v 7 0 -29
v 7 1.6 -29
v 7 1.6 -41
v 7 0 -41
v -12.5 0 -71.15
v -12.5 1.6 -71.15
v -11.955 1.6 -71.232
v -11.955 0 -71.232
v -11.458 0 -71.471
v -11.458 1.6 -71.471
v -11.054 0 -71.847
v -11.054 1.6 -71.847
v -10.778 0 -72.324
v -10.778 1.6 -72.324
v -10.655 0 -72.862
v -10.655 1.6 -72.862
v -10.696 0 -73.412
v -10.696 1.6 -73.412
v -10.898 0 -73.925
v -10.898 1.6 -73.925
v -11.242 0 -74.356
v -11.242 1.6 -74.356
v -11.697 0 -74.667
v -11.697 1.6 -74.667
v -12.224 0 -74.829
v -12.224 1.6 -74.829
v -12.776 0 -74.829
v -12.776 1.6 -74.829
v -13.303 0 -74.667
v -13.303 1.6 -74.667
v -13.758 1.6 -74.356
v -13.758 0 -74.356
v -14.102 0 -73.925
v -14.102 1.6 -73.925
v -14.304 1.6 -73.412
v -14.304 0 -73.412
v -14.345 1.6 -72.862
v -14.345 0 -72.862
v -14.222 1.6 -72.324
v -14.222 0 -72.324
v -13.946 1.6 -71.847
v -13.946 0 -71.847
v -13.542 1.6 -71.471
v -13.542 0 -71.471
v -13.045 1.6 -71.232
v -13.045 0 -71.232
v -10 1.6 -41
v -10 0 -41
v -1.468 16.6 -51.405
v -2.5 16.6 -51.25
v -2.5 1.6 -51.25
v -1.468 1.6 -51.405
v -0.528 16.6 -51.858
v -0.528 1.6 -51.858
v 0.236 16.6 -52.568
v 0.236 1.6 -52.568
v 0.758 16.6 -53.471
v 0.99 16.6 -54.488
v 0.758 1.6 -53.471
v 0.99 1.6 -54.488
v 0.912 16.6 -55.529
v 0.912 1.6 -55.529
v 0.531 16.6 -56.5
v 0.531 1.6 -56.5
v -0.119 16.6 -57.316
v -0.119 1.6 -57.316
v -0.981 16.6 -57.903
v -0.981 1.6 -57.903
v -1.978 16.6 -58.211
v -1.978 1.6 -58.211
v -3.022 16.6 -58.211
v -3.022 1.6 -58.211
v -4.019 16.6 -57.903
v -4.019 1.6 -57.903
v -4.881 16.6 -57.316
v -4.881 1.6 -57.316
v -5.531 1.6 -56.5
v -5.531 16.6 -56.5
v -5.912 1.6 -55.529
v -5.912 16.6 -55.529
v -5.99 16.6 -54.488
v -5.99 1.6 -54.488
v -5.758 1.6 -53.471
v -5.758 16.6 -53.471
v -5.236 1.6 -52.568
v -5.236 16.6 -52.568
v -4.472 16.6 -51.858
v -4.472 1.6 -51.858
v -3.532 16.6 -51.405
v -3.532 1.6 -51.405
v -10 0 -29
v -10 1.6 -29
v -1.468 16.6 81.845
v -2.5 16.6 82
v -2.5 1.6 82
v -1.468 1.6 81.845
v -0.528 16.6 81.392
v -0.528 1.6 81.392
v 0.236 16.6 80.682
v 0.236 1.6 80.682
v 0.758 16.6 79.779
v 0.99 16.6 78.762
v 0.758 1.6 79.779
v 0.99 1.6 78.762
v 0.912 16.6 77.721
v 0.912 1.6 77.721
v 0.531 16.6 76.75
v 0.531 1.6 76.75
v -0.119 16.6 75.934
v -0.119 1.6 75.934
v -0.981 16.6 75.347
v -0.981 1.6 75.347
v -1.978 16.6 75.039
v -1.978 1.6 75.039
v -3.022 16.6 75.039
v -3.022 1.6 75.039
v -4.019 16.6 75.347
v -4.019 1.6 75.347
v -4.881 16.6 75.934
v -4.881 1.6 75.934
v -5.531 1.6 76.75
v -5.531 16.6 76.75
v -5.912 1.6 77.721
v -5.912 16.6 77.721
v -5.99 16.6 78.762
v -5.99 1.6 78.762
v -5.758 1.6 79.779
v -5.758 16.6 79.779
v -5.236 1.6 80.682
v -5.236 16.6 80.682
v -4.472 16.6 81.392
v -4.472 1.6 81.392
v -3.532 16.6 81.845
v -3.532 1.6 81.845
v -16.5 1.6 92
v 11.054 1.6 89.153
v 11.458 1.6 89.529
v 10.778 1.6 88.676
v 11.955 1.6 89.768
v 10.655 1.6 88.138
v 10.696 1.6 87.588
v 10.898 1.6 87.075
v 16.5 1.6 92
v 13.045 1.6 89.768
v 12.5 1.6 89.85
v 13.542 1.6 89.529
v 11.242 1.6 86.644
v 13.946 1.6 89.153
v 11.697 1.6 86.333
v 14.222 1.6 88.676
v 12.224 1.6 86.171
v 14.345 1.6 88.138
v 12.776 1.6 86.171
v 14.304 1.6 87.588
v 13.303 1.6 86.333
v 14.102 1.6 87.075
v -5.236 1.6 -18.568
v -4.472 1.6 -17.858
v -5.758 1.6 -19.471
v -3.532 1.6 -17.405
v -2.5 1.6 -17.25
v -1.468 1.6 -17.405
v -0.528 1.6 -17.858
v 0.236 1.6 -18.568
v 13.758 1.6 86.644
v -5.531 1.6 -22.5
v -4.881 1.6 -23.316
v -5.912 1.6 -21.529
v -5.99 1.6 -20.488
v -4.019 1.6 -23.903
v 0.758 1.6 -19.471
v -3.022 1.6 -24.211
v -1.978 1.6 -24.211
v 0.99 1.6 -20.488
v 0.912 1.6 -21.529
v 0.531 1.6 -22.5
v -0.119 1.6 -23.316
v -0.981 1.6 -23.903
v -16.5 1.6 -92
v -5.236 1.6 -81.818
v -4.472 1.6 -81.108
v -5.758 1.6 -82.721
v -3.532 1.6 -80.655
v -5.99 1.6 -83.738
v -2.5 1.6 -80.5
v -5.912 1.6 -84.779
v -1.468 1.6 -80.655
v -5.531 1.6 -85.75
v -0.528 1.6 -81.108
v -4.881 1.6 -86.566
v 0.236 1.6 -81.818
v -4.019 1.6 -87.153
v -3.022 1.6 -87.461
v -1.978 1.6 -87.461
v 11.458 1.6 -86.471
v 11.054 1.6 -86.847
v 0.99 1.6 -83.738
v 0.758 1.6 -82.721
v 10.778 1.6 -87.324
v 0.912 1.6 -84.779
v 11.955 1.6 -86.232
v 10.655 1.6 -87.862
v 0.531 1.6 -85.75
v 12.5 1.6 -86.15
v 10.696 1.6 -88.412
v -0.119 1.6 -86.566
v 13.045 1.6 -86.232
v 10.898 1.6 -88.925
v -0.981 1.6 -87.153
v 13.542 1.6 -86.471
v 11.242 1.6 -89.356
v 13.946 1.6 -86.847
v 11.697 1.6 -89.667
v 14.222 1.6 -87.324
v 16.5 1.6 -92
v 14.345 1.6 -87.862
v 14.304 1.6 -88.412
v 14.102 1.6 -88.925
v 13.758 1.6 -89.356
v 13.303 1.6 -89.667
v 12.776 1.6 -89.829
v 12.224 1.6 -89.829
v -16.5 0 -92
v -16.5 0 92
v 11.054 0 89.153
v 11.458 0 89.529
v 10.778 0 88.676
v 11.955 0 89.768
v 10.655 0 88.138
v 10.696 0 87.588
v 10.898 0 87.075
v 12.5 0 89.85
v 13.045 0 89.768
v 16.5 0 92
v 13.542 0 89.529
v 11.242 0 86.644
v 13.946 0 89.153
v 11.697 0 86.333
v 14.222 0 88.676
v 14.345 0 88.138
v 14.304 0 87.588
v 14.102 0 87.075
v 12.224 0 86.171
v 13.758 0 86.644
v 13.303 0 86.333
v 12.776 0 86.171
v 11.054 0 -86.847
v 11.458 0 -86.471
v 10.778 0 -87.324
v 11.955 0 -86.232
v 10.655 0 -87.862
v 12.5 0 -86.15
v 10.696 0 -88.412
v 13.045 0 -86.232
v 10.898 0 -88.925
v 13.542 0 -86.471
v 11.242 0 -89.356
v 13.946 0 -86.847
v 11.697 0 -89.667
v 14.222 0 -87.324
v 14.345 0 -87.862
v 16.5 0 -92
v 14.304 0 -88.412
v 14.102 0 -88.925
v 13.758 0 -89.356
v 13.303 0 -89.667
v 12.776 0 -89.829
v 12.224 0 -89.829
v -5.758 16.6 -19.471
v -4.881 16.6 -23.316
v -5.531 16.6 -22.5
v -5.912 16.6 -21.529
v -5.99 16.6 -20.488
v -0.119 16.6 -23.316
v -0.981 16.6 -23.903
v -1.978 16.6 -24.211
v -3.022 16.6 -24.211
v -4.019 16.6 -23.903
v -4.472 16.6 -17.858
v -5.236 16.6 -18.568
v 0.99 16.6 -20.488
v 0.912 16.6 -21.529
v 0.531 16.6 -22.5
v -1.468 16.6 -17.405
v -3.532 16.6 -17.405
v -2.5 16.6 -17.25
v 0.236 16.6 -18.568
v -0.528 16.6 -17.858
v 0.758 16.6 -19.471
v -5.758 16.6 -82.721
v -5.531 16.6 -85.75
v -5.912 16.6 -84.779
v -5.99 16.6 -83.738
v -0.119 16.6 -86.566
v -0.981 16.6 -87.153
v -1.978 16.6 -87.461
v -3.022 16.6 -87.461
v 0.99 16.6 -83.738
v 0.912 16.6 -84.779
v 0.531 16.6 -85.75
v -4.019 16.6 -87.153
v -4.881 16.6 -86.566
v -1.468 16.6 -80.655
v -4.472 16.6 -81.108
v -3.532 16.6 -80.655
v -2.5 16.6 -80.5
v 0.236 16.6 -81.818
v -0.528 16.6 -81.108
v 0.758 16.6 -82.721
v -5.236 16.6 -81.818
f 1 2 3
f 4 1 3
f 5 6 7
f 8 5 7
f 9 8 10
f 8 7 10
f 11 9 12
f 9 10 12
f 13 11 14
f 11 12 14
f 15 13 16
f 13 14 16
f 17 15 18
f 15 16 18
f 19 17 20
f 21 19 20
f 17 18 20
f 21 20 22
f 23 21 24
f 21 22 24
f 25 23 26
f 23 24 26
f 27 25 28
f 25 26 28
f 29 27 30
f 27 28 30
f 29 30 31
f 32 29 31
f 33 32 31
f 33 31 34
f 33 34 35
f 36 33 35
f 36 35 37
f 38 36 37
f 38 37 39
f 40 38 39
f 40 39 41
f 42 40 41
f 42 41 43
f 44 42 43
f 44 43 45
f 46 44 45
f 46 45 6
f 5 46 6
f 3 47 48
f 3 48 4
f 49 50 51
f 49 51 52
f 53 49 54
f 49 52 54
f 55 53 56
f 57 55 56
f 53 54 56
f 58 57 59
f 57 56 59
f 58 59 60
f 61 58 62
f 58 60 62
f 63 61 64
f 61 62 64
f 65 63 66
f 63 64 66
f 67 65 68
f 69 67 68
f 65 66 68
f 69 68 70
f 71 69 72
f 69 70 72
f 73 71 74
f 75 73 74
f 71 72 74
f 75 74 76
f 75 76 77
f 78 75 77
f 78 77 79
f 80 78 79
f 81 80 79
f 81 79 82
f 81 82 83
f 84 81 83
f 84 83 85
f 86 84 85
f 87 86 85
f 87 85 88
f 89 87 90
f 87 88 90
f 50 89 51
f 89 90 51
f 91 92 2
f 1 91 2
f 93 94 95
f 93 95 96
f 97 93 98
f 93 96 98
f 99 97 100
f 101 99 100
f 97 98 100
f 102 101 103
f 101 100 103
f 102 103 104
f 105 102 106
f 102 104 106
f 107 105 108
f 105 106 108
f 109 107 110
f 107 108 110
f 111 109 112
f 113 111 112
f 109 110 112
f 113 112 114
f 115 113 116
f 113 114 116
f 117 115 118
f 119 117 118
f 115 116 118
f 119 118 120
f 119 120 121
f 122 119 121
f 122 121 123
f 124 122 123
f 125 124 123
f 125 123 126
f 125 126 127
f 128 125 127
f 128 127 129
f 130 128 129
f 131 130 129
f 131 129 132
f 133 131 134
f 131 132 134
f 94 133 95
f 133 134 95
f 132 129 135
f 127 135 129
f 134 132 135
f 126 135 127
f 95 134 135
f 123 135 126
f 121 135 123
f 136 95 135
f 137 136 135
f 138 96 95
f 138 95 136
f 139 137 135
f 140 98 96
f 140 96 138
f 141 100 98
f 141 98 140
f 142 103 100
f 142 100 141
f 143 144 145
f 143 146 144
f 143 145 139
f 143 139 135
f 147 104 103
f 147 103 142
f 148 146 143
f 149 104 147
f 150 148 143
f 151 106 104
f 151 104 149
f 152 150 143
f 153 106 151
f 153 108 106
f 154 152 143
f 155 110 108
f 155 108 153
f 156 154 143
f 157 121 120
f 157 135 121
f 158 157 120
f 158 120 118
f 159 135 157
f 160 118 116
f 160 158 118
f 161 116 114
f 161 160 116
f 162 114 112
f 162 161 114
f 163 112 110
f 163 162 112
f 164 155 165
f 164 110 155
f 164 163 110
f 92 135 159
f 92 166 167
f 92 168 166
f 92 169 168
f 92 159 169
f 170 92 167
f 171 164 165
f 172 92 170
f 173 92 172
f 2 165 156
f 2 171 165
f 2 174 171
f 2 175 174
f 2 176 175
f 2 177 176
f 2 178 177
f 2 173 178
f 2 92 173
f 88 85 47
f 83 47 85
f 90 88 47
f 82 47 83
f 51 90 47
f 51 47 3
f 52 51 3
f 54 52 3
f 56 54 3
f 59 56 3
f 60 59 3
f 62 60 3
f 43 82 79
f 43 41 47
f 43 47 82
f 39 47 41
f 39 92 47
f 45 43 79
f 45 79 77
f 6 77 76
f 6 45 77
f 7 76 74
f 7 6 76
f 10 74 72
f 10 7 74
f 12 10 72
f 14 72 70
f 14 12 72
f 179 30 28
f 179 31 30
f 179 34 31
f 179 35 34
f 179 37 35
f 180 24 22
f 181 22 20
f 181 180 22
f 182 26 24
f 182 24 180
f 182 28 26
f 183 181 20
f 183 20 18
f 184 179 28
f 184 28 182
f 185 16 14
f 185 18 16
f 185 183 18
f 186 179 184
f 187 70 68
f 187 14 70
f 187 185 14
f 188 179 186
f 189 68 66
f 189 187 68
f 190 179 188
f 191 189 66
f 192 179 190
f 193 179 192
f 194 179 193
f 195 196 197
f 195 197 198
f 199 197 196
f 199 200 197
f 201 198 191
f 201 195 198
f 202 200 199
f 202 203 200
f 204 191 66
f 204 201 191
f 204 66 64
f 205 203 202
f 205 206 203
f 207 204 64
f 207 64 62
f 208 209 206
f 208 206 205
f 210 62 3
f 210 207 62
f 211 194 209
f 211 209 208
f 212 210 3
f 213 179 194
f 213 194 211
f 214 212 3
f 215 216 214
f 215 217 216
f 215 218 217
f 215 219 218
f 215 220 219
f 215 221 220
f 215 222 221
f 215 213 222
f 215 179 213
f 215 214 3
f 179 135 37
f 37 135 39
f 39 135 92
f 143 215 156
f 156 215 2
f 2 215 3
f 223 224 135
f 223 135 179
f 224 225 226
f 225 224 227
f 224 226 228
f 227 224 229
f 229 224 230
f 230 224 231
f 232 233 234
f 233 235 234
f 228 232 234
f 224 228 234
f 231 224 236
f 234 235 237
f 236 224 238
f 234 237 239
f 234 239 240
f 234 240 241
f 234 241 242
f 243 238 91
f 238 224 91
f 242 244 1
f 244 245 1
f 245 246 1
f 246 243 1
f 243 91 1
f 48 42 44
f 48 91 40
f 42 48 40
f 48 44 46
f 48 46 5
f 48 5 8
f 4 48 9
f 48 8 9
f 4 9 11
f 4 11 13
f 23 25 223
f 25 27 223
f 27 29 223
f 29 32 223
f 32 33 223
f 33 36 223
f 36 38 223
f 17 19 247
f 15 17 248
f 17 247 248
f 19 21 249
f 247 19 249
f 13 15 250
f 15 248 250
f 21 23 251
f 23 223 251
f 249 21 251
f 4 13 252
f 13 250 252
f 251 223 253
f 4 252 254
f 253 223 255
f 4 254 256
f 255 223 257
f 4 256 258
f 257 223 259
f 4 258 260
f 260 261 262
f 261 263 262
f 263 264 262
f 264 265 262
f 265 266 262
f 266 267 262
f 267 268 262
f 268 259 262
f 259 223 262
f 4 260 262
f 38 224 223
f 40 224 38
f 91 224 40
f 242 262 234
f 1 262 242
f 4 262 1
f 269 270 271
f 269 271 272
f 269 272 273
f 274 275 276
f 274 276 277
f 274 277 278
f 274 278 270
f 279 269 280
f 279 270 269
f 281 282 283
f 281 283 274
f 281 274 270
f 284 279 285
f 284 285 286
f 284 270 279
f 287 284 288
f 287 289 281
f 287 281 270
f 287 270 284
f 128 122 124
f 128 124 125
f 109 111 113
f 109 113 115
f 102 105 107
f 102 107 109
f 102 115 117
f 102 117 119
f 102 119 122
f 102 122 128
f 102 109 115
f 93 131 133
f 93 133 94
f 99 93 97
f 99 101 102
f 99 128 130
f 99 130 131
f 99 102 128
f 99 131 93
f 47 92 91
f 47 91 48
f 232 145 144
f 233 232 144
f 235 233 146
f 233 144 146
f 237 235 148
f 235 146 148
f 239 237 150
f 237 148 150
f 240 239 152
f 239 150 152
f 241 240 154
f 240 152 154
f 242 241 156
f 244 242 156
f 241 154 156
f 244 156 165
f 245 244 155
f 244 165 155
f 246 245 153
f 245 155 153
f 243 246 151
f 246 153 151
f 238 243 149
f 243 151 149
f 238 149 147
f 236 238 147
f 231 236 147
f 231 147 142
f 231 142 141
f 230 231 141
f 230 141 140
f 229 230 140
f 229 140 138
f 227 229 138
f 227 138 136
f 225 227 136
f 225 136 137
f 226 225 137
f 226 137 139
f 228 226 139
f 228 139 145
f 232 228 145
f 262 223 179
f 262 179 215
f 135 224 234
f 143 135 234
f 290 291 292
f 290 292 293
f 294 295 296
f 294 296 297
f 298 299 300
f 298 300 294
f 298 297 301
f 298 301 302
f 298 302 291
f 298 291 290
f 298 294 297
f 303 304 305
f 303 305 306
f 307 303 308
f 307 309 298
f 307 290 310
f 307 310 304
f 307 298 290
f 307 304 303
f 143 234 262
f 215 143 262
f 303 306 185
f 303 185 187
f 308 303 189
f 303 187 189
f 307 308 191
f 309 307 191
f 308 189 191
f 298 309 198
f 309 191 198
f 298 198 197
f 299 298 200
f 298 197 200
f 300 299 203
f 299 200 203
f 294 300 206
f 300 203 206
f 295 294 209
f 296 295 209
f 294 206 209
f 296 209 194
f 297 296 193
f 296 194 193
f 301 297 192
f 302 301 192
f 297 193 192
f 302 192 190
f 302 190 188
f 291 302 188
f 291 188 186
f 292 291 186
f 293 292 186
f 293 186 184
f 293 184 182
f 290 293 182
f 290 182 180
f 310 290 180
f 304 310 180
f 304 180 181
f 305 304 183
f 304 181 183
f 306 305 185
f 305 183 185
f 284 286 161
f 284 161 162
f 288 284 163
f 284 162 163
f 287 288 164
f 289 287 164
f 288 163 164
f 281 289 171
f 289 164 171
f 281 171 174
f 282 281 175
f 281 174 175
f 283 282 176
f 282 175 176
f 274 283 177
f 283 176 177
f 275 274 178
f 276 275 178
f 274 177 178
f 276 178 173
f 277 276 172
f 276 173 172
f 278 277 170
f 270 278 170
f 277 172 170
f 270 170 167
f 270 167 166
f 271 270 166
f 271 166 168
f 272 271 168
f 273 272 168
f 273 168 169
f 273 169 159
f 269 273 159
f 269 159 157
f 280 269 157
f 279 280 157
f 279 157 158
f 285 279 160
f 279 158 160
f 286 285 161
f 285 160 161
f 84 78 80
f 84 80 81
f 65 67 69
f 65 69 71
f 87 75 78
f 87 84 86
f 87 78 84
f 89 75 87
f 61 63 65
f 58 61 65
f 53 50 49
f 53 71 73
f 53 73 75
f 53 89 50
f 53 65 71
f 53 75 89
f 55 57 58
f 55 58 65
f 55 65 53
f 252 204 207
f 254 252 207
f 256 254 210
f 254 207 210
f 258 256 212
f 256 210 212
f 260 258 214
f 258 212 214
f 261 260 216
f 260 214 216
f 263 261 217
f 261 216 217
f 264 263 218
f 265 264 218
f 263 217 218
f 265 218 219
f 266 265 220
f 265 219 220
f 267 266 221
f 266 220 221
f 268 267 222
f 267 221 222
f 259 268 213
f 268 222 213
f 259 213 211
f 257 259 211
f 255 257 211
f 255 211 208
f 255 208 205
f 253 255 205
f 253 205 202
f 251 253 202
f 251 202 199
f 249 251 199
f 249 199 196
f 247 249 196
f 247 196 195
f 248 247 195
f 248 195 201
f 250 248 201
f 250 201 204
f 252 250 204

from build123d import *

# Parameters (mm, degrees)
SKETCH1_W           = 33
SKETCH1_H           = 184
BOSS_EXTRUDE1_DEPTH = 1.6
SKETCH2_R           = 1.85
CUT_EXTRUDE1_DEPTH  = 94.481602468
SKETCH3_R           = 3.5
BOSS_EXTRUDE2_DEPTH = 15
SKETCH4_W           = 17
SKETCH4_H           = 12
CUT_EXTRUDE2_DEPTH  = 95.663879067


with BuildPart() as part:
    # Sketch1 → Boss-Extrude1 (new body)
    with BuildSketch(Plane(origin=(0, 0, 0), x_dir=(1, 0, 0), z_dir=(0, 1, 0))):
        Rectangle(SKETCH1_W, SKETCH1_H)
    extrude(amount=BOSS_EXTRUDE1_DEPTH)

    # Sketch2 → Cut-Extrude1 (cut, through all)
    with BuildSketch(Plane(origin=(0, 1.6, 0), x_dir=(1, 0, 0), z_dir=(0, 1, 0))):
        with Locations(Location((-12.5, 73, 0), (0, 0, 270))):
            Circle(SKETCH2_R)
        with Locations(Location((12.5, 88, 0), (0, 0, 270))):
            Circle(SKETCH2_R)
        with Locations(Location((12.5, -88, 0), (0, 0, 270))):
            Circle(SKETCH2_R)
    extrude(amount=-CUT_EXTRUDE1_DEPTH, mode=Mode.SUBTRACT)

    # Sketch3 → Boss-Extrude2 (add)
    with BuildSketch(Plane(origin=(0, 1.6, 0), x_dir=(1, 0, 0), z_dir=(0, 1, 0))):
        with Locations(Location((-2.5, 84, 0), (0, 0, 270))):
            Circle(SKETCH3_R)
        with Locations(Location((-2.5, 54.75, 0), (0, 0, 270))):
            Circle(SKETCH3_R)
        with Locations(Location((-2.5, 20.75, 0), (0, 0, 270))):
            Circle(SKETCH3_R)
        with Locations(Location((-2.5, -78.5, 0), (0, 0, 270))):
            Circle(SKETCH3_R)
    extrude(amount=BOSS_EXTRUDE2_DEPTH)

    # Sketch4 → Cut-Extrude2 (cut, through all)
    with BuildSketch(Plane(origin=(0, 1.6, 0), x_dir=(1, 0, 0), z_dir=(0, 1, 0))):
        with Locations((-1.5, 35)):
            Rectangle(SKETCH4_W, SKETCH4_H)
    extrude(amount=-CUT_EXTRUDE2_DEPTH, mode=Mode.SUBTRACT)


solid = part.part
